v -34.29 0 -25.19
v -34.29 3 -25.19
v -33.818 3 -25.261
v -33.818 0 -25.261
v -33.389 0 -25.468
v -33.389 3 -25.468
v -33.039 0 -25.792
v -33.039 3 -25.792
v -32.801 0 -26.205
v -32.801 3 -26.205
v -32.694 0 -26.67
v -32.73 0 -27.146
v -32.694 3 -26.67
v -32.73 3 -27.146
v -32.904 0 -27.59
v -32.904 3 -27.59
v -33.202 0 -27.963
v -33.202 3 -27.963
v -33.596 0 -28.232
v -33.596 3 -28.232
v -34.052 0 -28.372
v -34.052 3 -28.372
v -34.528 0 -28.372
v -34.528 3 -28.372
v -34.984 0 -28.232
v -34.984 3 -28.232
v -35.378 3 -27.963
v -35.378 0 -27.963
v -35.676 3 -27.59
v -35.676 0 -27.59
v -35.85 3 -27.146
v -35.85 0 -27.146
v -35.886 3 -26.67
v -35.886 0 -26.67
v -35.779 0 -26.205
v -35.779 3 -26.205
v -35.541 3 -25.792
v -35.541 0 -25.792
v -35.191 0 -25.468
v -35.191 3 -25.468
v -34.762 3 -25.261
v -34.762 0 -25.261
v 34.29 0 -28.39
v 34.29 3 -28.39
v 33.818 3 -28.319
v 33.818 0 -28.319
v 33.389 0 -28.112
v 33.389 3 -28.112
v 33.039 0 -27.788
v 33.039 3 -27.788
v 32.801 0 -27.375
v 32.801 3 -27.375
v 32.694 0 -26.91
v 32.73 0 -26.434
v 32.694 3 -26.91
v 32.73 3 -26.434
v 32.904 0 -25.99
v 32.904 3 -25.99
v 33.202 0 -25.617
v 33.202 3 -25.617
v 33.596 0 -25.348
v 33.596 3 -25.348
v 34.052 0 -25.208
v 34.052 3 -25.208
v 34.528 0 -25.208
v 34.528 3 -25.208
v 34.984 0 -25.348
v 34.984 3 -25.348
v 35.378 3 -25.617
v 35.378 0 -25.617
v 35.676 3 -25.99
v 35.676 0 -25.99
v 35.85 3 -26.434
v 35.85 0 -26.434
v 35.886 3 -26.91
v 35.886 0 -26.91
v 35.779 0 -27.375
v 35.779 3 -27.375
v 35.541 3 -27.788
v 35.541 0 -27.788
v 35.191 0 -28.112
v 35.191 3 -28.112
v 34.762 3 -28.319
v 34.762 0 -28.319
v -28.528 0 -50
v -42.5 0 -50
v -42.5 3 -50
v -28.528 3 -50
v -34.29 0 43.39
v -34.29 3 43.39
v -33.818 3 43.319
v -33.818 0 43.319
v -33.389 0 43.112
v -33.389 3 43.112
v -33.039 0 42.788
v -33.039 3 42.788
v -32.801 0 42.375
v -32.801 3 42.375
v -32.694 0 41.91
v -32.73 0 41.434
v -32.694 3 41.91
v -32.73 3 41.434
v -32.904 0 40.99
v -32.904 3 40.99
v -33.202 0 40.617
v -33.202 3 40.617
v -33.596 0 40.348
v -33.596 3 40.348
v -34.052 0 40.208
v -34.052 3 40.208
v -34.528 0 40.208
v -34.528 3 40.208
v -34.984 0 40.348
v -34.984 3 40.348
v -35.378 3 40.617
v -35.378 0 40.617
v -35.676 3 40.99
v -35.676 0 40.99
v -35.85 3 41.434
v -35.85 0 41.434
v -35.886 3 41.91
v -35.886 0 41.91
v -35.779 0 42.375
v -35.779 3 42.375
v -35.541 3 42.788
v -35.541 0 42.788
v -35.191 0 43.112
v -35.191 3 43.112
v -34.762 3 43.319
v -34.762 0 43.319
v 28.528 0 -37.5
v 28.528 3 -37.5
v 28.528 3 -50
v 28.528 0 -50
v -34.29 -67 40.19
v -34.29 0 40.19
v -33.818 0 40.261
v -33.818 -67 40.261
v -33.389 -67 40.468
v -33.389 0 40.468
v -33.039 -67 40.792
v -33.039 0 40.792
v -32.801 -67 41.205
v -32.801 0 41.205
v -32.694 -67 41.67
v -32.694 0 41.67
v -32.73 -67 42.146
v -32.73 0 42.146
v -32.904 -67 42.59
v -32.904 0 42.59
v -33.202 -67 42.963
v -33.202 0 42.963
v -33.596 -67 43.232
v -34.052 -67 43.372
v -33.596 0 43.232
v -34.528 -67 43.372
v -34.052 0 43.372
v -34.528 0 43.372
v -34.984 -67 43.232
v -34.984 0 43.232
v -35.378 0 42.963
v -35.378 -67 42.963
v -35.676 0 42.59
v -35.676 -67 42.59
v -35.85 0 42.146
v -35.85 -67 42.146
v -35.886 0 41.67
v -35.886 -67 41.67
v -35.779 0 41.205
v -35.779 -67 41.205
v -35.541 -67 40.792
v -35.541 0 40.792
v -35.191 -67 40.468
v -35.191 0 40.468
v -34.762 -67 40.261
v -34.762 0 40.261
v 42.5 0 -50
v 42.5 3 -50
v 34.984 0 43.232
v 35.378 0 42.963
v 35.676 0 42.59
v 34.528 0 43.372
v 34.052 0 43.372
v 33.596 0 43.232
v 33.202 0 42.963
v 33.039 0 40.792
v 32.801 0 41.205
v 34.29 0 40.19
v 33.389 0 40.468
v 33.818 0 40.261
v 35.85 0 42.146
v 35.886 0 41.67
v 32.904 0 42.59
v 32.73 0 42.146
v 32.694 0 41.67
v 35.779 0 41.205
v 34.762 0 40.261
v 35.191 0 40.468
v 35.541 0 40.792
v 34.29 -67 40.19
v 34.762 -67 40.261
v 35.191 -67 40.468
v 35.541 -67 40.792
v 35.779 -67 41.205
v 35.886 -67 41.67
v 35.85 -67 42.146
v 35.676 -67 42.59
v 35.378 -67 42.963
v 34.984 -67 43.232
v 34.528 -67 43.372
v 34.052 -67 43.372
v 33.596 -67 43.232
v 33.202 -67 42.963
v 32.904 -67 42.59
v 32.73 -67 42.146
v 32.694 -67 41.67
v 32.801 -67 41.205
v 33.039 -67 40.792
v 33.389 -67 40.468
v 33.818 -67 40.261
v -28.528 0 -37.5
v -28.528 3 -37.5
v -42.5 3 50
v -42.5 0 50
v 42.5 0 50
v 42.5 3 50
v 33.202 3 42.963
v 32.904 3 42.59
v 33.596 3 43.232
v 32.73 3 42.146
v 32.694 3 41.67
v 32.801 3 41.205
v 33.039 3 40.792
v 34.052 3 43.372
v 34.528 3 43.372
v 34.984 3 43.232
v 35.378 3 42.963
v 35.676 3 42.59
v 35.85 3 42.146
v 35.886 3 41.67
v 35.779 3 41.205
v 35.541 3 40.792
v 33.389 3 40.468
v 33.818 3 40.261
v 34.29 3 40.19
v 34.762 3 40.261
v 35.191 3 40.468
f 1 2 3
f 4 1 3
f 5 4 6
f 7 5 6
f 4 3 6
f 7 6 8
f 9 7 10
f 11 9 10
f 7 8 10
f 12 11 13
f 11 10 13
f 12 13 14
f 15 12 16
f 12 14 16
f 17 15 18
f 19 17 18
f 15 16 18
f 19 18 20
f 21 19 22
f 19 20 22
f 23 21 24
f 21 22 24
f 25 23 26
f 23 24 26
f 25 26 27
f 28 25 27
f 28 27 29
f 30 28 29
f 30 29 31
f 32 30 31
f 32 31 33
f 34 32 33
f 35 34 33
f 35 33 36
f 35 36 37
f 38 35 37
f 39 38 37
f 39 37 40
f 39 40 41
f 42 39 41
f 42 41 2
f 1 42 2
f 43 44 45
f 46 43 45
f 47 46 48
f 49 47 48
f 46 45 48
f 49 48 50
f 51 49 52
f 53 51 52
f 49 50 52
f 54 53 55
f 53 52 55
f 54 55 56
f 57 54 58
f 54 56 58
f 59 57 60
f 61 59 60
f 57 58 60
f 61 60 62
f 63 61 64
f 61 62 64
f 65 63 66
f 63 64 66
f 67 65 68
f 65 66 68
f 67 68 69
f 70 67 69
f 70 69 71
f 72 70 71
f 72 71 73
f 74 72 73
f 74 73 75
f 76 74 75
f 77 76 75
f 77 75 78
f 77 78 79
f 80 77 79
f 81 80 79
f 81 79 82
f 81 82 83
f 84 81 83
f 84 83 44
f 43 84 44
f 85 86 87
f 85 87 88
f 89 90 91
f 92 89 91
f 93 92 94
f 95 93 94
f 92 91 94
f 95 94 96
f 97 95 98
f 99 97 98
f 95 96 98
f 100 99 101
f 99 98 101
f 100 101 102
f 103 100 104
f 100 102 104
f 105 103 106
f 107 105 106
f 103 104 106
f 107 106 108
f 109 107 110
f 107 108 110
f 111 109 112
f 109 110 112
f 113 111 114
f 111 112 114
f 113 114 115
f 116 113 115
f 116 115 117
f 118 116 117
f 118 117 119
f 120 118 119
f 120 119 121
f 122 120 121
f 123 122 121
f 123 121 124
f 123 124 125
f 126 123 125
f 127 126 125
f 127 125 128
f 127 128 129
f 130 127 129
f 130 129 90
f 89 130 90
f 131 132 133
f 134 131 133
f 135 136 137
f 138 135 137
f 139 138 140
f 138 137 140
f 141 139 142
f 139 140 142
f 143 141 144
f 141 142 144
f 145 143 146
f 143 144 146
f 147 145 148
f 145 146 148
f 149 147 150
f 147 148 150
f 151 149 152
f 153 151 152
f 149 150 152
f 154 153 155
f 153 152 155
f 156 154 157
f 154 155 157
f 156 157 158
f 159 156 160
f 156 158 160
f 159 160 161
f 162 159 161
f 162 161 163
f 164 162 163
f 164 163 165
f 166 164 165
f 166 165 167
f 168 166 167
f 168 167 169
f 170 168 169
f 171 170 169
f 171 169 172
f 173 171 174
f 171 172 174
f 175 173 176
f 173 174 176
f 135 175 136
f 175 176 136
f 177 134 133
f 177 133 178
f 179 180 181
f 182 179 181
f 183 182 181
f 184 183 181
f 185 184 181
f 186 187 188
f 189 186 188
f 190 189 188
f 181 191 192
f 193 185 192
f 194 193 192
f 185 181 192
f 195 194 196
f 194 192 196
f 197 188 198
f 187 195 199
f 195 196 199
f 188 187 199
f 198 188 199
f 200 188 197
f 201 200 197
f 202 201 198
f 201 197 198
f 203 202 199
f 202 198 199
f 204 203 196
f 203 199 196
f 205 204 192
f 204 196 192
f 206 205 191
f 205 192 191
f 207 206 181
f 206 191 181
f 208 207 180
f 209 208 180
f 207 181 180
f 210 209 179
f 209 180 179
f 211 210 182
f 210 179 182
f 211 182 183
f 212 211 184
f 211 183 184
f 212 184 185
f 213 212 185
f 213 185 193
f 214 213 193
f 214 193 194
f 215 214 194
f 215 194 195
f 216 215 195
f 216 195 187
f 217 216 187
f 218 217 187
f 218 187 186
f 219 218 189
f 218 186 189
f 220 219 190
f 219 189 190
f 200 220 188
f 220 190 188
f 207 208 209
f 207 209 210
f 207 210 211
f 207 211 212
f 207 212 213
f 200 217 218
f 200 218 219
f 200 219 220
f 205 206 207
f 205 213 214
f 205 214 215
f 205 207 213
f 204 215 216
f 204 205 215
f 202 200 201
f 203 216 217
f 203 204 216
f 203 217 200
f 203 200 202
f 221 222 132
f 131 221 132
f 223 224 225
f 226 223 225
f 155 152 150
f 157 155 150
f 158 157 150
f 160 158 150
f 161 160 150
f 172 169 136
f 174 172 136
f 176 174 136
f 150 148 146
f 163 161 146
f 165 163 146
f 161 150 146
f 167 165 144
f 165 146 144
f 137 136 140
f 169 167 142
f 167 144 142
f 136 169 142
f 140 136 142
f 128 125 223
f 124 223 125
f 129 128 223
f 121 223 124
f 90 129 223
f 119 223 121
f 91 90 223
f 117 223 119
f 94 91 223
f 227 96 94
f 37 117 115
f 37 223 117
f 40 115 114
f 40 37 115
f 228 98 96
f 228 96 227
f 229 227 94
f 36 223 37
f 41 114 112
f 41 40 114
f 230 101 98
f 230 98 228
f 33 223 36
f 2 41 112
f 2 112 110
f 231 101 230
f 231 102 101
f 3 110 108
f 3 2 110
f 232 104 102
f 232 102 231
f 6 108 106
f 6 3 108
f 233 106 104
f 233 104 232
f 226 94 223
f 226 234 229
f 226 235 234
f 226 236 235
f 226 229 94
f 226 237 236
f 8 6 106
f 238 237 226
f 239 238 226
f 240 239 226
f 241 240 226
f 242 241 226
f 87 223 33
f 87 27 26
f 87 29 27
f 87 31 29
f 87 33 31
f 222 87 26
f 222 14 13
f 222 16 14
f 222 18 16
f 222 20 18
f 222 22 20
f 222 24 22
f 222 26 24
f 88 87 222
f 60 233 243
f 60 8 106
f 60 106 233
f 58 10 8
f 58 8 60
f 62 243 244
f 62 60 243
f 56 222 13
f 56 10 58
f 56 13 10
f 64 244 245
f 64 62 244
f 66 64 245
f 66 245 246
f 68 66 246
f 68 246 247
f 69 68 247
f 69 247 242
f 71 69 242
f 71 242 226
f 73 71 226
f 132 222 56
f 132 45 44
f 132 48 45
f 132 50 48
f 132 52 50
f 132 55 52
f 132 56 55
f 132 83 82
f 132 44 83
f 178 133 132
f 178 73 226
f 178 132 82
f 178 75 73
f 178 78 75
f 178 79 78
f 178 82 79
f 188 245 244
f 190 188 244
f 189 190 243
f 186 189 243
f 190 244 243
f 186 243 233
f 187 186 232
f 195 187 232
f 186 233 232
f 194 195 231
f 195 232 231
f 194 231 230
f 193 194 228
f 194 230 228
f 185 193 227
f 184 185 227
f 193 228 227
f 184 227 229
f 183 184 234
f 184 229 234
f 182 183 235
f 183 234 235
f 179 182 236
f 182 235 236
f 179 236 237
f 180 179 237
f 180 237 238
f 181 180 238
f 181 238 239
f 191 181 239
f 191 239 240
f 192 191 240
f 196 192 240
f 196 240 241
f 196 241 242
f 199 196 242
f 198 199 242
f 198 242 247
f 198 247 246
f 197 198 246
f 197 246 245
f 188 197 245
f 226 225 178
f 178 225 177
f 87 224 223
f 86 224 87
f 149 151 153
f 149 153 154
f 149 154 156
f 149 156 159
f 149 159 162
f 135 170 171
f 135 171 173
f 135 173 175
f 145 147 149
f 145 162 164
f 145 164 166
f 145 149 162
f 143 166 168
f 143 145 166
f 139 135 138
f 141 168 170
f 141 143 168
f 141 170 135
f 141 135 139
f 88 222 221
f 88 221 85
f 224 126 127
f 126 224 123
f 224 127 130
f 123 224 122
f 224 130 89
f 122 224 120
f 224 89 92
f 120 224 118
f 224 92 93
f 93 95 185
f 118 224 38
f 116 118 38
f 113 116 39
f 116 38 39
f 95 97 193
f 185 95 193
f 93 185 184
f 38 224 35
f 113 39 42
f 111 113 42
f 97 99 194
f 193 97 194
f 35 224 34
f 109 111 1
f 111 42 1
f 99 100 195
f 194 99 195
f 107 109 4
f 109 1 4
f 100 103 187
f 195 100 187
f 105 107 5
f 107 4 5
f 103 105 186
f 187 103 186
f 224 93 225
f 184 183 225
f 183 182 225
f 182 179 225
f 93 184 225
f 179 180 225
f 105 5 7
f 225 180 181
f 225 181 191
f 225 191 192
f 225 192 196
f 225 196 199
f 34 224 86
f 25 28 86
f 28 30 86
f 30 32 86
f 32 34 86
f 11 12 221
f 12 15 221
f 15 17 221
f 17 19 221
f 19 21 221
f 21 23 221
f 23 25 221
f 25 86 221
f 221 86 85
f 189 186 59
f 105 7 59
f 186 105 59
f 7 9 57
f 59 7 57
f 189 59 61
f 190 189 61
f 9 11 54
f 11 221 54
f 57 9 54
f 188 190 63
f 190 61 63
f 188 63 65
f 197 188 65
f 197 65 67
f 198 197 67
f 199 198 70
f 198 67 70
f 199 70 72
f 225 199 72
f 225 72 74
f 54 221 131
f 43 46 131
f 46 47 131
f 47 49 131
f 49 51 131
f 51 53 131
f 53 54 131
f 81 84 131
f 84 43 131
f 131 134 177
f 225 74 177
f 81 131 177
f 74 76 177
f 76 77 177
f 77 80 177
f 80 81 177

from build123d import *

# Parameters (mm, degrees)
SKETCH1_W             = 85
SKETCH1_H             = 100
BOSS_EXTRUDE1_DEPTH   = 3
SKETCH2_R             = 1.6
CUT_EXTRUDE1_DEPTH    = 66.690562488
SKETCH3_R             = 1.6
BOSS_EXTRUDE2_DEPTH   = 67
BOSS_EXTRUDE2_2_DEPTH = 67
SKETCH4_W             = 57.05674143
SKETCH4_H             = 25
CUT_EXTRUDE2_DEPTH    = 96.949205312


with BuildPart() as part:
    # Sketch1 → Boss-Extrude1 (new body)
    with BuildSketch(Plane(origin=(0, 0, 0), x_dir=(1, 0, 0), z_dir=(0, 1, 0))):
        Rectangle(SKETCH1_W, SKETCH1_H)
    extrude(amount=BOSS_EXTRUDE1_DEPTH)

    # Sketch2 → Cut-Extrude1 (cut, through all)
    with BuildSketch(Plane(origin=(0, 3, 0), x_dir=(1, 0, 0), z_dir=(0, 1, 0))):
        with Locations(Location((-34.29, 26.79, 0), (0, 0, 270))):
            Circle(SKETCH2_R)
        with Locations(Location((-34.29, -41.79, 0), (0, 0, 270))):
            Circle(SKETCH2_R)
        with Locations(Location((34.29, -41.79, 0), (0, 0, 90))):
            Circle(SKETCH2_R)
        with Locations(Location((34.29, 26.79, 0), (0, 0, 90))):
            Circle(SKETCH2_R)
    extrude(amount=-CUT_EXTRUDE1_DEPTH, mode=Mode.SUBTRACT)

    # Sketch4 → Cut-Extrude2 (cut, through all)
    with BuildSketch(Plane(origin=(0, 3, 0), x_dir=(1, 0, 0), z_dir=(0, 1, 0))):
        with Locations((0, 50)):
            Rectangle(SKETCH4_W, SKETCH4_H)
    extrude(amount=-CUT_EXTRUDE2_DEPTH, mode=Mode.SUBTRACT)


with BuildPart() as body_2:
    # Sketch3 → Boss-Extrude2 (new body)
    with BuildSketch(Plane.XZ):
        with Locations(Location((-34.29, 41.79, 0), (0, 0, 270))):
            Circle(SKETCH3_R)
    extrude(amount=BOSS_EXTRUDE2_DEPTH)


with BuildPart() as body_3:
    # Sketch3 → Boss-Extrude2 2 (new body)
    with BuildSketch(Plane.XZ):
        with Locations(Location((34.29, 41.79, 0), (0, 0, 270))):
            Circle(SKETCH3_R)
    extrude(amount=BOSS_EXTRUDE2_2_DEPTH)


solid = Compound([part.part, body_2.part, body_3.part])
